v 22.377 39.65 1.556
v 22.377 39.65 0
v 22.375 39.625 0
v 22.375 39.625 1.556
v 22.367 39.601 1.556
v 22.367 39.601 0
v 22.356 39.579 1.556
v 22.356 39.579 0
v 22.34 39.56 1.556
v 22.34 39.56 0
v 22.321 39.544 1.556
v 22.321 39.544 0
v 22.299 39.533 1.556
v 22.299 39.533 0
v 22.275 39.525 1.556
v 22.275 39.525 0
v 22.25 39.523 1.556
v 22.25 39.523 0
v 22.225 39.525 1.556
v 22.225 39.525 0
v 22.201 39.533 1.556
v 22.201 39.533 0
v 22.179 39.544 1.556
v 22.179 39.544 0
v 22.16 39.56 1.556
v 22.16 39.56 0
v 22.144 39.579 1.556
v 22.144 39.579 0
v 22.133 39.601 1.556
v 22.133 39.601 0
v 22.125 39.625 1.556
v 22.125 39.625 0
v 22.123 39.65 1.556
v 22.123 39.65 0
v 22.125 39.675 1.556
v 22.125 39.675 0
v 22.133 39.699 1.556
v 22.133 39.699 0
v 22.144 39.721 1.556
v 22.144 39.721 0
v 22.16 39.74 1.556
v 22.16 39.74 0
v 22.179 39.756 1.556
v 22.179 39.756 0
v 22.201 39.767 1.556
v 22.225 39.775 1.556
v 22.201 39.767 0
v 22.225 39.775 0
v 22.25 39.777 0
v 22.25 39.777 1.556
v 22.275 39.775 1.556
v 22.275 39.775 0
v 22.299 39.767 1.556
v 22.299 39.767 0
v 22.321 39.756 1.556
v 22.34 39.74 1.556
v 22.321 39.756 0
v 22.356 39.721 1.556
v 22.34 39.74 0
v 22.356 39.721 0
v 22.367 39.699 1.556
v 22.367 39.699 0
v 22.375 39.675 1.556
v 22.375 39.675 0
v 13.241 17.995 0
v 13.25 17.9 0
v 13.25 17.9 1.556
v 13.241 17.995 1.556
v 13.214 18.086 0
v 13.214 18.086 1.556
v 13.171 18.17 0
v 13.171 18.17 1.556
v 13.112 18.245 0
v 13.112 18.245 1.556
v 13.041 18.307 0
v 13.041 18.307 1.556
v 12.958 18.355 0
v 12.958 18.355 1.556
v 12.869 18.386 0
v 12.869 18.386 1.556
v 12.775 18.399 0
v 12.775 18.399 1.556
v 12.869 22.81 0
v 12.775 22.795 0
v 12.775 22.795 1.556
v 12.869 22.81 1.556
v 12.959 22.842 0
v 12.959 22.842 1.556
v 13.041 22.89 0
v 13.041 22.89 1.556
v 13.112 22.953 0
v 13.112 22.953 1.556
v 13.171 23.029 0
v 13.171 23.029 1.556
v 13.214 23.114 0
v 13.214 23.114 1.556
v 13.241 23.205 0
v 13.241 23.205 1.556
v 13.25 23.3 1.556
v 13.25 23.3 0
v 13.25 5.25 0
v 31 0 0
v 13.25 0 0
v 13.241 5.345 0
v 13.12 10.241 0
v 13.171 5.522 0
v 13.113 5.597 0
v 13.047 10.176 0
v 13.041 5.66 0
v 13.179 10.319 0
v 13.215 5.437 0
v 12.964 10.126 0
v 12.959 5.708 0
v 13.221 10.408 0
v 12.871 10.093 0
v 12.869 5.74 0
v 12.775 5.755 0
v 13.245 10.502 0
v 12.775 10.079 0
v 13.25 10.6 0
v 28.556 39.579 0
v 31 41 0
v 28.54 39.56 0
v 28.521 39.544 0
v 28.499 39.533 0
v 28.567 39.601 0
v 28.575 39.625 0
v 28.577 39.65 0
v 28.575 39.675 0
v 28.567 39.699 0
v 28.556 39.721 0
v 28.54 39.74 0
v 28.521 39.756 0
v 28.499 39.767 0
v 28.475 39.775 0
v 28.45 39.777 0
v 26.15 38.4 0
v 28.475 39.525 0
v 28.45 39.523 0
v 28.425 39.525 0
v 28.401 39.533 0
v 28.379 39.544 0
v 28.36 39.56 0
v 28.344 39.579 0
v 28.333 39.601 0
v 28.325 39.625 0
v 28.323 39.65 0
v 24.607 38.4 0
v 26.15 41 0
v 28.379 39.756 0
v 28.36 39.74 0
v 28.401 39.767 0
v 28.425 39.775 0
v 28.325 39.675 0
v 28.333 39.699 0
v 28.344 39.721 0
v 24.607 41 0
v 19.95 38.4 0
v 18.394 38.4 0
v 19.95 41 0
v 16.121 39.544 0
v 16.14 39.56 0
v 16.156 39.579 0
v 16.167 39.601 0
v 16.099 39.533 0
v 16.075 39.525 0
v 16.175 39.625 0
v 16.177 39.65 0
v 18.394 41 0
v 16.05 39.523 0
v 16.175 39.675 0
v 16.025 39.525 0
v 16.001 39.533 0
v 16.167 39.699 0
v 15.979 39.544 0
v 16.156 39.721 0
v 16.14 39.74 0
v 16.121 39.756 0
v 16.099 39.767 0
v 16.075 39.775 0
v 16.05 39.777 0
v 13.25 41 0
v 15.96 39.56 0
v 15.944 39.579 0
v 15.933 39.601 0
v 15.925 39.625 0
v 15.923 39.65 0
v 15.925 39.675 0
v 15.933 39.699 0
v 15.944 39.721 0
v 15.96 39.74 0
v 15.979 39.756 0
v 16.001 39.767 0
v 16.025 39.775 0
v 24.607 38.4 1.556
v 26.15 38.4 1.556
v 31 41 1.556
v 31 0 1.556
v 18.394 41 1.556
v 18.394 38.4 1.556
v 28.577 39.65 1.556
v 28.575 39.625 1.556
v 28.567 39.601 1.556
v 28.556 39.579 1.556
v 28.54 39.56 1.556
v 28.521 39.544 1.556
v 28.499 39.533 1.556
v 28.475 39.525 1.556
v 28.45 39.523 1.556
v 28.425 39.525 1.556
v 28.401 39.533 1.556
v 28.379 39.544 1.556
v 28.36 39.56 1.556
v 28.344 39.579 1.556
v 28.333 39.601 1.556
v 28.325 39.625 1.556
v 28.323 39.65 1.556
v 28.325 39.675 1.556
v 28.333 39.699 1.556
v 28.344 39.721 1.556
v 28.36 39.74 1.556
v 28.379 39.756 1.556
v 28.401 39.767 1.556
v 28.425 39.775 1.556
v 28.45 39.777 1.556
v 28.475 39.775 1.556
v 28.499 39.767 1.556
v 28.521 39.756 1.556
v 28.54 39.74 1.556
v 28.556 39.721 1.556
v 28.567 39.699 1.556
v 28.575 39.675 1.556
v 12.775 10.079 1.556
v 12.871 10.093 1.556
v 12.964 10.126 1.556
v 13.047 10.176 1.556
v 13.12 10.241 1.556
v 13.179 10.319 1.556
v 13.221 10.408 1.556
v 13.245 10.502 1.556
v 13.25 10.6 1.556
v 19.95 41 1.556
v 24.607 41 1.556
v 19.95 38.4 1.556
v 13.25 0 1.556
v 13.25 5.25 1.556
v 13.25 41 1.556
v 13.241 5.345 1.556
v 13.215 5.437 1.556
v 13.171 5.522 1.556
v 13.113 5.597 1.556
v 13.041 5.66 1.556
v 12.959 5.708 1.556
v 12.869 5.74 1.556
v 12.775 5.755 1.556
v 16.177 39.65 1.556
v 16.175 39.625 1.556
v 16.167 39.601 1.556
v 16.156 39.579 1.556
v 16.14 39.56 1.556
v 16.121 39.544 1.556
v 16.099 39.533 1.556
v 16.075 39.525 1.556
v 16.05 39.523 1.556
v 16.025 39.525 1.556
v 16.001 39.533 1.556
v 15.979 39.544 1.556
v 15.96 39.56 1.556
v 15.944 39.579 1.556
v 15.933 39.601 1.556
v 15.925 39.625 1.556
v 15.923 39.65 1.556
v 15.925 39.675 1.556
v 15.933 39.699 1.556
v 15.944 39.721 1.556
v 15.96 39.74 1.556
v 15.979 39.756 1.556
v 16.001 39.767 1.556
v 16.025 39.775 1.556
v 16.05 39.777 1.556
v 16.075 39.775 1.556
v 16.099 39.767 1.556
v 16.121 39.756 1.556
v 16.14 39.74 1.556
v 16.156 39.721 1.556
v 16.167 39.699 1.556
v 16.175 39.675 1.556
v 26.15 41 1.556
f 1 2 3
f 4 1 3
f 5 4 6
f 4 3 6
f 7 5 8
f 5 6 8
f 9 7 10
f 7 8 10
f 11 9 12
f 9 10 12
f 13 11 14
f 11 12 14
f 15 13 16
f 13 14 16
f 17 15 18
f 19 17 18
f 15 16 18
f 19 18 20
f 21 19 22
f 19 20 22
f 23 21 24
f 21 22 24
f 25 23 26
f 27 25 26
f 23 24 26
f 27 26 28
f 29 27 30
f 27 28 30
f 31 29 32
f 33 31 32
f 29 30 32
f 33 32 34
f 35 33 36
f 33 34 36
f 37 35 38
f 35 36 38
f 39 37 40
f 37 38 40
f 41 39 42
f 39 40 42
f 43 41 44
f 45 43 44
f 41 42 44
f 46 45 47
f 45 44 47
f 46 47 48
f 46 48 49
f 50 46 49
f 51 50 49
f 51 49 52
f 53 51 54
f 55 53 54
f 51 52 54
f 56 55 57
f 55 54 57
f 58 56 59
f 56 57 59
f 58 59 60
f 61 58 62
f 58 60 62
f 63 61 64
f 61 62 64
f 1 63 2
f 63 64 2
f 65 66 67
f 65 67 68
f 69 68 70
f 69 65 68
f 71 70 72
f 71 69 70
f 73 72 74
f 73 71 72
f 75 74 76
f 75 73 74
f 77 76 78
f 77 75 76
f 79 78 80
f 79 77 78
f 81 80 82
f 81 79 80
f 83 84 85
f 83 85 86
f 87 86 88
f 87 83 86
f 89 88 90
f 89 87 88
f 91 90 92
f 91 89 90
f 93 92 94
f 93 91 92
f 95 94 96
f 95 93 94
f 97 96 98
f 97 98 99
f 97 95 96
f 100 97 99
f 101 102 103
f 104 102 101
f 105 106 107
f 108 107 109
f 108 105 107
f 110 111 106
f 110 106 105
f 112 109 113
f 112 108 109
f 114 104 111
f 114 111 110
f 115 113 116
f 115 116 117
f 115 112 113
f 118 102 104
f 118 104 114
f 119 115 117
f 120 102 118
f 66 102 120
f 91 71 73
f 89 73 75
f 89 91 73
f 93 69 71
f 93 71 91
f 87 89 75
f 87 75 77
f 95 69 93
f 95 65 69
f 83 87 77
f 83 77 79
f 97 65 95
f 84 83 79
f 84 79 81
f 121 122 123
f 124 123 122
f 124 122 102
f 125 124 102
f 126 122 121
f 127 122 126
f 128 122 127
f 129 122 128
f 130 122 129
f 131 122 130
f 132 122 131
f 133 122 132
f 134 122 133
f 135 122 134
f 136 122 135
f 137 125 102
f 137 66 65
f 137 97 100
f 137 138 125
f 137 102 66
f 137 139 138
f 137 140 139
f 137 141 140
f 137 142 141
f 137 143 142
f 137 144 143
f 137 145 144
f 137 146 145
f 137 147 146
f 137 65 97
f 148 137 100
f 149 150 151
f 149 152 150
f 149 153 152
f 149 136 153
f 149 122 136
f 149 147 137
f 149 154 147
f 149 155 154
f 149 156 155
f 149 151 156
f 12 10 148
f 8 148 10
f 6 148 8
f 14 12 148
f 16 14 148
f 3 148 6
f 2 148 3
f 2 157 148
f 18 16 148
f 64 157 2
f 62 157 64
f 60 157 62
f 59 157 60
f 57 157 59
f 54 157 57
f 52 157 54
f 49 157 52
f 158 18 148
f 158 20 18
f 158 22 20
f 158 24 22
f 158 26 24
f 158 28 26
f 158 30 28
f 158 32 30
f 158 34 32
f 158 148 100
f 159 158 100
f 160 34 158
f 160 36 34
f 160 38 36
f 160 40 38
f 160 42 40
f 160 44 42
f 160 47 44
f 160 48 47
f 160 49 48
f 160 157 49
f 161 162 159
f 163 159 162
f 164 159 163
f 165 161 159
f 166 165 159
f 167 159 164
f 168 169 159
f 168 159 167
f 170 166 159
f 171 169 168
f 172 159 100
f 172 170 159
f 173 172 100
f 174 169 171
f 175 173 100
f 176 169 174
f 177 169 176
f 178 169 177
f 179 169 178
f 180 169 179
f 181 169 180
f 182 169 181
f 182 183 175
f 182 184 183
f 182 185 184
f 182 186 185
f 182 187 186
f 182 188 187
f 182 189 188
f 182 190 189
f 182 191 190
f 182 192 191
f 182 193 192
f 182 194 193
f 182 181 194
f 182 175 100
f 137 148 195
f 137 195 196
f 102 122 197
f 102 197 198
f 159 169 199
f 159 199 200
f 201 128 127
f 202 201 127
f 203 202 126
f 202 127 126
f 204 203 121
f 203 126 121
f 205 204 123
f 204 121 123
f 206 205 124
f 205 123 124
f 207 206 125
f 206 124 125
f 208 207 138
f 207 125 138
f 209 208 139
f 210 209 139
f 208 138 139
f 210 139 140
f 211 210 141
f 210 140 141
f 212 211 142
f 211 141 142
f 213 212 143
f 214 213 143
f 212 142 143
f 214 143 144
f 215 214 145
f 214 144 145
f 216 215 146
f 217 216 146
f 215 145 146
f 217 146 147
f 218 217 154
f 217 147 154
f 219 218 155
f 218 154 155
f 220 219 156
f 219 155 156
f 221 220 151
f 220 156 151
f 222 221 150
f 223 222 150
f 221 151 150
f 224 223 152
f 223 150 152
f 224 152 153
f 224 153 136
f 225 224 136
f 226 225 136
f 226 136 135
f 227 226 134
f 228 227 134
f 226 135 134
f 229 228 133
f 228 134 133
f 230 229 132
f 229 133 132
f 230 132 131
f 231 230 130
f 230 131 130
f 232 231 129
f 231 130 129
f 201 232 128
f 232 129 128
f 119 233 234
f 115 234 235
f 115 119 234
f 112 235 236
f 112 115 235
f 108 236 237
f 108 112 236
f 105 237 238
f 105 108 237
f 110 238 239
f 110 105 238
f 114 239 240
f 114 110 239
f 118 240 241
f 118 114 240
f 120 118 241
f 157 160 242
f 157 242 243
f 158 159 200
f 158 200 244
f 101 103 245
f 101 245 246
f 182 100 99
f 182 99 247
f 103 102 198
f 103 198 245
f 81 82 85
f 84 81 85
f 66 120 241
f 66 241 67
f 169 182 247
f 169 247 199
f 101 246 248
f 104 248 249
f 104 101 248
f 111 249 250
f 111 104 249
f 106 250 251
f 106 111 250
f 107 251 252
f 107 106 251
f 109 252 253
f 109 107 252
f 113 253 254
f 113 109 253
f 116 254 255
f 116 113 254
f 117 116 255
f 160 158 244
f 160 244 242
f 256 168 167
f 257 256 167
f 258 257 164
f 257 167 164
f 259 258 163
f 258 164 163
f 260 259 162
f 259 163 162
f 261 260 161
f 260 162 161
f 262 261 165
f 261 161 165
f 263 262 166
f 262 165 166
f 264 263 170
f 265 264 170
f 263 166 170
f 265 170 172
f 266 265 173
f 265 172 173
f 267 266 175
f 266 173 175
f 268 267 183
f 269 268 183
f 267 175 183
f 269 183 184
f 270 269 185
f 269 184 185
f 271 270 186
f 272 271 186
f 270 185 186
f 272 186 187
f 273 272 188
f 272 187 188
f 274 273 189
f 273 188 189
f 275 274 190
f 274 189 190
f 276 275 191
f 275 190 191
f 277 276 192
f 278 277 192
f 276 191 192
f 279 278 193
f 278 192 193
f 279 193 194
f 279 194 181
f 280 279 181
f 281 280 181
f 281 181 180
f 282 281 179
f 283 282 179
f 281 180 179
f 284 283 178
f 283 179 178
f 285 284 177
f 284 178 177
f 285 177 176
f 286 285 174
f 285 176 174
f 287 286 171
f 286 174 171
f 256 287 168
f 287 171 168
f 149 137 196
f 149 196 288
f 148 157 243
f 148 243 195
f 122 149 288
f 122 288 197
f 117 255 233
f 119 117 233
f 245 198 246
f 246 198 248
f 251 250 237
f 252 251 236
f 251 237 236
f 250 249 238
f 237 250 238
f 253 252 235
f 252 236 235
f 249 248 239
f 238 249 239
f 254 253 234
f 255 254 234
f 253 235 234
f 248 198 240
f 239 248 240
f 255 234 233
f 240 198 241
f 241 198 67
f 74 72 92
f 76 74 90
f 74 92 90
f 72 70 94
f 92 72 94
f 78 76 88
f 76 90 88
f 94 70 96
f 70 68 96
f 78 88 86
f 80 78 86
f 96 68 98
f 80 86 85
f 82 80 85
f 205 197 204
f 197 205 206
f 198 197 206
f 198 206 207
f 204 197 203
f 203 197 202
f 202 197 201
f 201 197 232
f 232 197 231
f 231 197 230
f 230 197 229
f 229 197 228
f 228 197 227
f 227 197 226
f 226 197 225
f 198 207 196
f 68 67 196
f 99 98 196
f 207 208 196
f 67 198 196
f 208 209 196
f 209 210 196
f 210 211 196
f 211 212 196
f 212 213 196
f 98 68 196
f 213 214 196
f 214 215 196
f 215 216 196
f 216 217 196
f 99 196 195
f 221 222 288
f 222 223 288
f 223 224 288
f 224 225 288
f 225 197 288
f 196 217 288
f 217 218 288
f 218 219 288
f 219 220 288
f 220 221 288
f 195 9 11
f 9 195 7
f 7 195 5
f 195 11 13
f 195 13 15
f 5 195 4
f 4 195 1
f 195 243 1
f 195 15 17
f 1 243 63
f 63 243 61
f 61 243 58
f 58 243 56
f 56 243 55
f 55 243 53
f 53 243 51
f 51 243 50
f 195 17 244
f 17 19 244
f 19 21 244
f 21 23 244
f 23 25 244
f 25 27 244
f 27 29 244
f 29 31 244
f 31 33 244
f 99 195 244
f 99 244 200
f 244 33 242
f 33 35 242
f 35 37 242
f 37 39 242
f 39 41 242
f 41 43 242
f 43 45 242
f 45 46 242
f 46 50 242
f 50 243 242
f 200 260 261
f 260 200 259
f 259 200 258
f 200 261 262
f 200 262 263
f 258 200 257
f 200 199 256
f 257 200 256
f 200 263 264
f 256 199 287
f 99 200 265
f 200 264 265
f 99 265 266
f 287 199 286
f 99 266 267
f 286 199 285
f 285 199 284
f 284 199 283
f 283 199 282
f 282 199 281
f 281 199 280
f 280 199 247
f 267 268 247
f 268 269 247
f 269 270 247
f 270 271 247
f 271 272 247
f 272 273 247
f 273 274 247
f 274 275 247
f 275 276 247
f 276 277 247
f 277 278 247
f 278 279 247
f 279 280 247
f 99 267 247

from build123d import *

# Parameters (mm, degrees)
ESQUISSE1_R             = 0.127
ESQUISSE1_R_2           = 0.3999992
ESQUISSE1_R_3           = 0.4953
BOSS_EXTRU_1_DEPTH      = 1.55632912
ESQUISSE2_W             = 12.774737624
ESQUISSE2_H             = 41
ENL_V_MAT_EXTRU_1_DEPTH = 52.423945398


with BuildPart() as part:
    # Esquisse1 → Boss.-Extru.1 (new body)
    with BuildSketch(Plane(origin=(0, 0, 0), x_dir=(-1, 0, 0), z_dir=(0, 0, -1))):
        with BuildLine():
            Line((-12.23900032, 5.25), (-12.23900032, 0))
            Line((-12.23900032, 0), (0, 0))
            Line((0, 0), (0, 41))
            Line((0, 41), (-12.23900032, 41))
            Line((-12.23900032, 41), (-12.23900032, 23.299999237))
            ThreePointArc((-12.23900032, 23.299999237), (-12.74450016, 22.794499397), (-13.25, 23.299999237))
            Line((-13.25, 23.299999237), (-13.25, 41))
            Line((-13.25, 41), (-18.3939991, 41))
            Line((-18.3939991, 41), (-18.3939991, 38.400001526))
            Line((-18.3939991, 38.400001526), (-19.950000763, 38.400001526))
            Line((-19.950000763, 38.400001526), (-19.950000763, 41))
            Line((-19.950000763, 41), (-24.607000351, 41))
            Line((-24.607000351, 41), (-24.607000351, 38.400001526))
            Line((-24.607000351, 38.400001526), (-26.149999619, 38.400001526))
            Line((-26.149999619, 38.400001526), (-26.149999619, 41))
            Line((-26.149999619, 41), (-31, 41))
            Line((-31, 41), (-31, 0))
            Line((-31, 0), (-13.25, 0))
            Line((-13.25, 0), (-13.25, 5.25))
            ThreePointArc((-13.25, 5.25), (-12.74450016, 5.756000289), (-12.23900032, 5.25))
        make_face()
        with Locations(Location((-22.24999868, 39.64999944, 0), (0, 0, 180))):
            Circle(ESQUISSE1_R, mode=Mode.SUBTRACT)
        with Locations(Location((-28.44999898, 39.64999944, 0), (0, 0, 180))):
            Circle(ESQUISSE1_R, mode=Mode.SUBTRACT)
        with Locations(Location((-16.04999838, 39.64999944, 0), (0, 0, 180))):
            Circle(ESQUISSE1_R, mode=Mode.SUBTRACT)
        with Locations(Location((-8.7900002, 35.81500076, 0), (0, 0, 180))):
            Circle(ESQUISSE1_R_2, mode=Mode.SUBTRACT)
        with Locations(Location((-6.2500002, 38.35500076, 0), (0, 0, 180))):
            Circle(ESQUISSE1_R_2, mode=Mode.SUBTRACT)
        with Locations(Location((-3.7100002, 35.81500076, 0), (0, 0, 180))):
            Circle(ESQUISSE1_R_2, mode=Mode.SUBTRACT)
        with Locations(Location((-3.59000044, 6.14000042, 0), (0, 0, 180))):
            Circle(ESQUISSE1_R_3, mode=Mode.SUBTRACT)
        with Locations(Location((-1.05000044, 6.14000042, 0), (0, 0, 180))):
            Circle(ESQUISSE1_R_3, mode=Mode.SUBTRACT)
        with Locations(Location((-1.05000044, 1.06000042, 0), (0, 0, 180))):
            Circle(ESQUISSE1_R_3, mode=Mode.SUBTRACT)
        with Locations(Location((-1.05000044, 3.60000042, 0), (0, 0, 180))):
            Circle(ESQUISSE1_R_3, mode=Mode.SUBTRACT)
        with BuildLine():
            Line((-12.250000009, 17.899931304), (-12.251000404, 10.578000069))
            ThreePointArc((-12.251000404, 10.578000069), (-12.761750957, 10.078121146), (-13.25, 10.600000381))
            Line((-13.25, 10.600000381), (-13.25, 17.899999619))
            ThreePointArc((-13.25, 17.899999619), (-12.749965845, 18.399999615), (-12.250000009, 17.899931304))
        make_face(mode=Mode.SUBTRACT)
    extrude(amount=-BOSS_EXTRU_1_DEPTH)

    # Esquisse2 → Enlèv. mat.-Extru.1 (cut, through all)
    with BuildSketch(Plane.XY.offset(1.55632912)):
        with Locations((6.387368812, 20.5)):
            Rectangle(ESQUISSE2_W, ESQUISSE2_H)
    extrude(amount=-ENL_V_MAT_EXTRU_1_DEPTH, mode=Mode.SUBTRACT)


solid = part.part
